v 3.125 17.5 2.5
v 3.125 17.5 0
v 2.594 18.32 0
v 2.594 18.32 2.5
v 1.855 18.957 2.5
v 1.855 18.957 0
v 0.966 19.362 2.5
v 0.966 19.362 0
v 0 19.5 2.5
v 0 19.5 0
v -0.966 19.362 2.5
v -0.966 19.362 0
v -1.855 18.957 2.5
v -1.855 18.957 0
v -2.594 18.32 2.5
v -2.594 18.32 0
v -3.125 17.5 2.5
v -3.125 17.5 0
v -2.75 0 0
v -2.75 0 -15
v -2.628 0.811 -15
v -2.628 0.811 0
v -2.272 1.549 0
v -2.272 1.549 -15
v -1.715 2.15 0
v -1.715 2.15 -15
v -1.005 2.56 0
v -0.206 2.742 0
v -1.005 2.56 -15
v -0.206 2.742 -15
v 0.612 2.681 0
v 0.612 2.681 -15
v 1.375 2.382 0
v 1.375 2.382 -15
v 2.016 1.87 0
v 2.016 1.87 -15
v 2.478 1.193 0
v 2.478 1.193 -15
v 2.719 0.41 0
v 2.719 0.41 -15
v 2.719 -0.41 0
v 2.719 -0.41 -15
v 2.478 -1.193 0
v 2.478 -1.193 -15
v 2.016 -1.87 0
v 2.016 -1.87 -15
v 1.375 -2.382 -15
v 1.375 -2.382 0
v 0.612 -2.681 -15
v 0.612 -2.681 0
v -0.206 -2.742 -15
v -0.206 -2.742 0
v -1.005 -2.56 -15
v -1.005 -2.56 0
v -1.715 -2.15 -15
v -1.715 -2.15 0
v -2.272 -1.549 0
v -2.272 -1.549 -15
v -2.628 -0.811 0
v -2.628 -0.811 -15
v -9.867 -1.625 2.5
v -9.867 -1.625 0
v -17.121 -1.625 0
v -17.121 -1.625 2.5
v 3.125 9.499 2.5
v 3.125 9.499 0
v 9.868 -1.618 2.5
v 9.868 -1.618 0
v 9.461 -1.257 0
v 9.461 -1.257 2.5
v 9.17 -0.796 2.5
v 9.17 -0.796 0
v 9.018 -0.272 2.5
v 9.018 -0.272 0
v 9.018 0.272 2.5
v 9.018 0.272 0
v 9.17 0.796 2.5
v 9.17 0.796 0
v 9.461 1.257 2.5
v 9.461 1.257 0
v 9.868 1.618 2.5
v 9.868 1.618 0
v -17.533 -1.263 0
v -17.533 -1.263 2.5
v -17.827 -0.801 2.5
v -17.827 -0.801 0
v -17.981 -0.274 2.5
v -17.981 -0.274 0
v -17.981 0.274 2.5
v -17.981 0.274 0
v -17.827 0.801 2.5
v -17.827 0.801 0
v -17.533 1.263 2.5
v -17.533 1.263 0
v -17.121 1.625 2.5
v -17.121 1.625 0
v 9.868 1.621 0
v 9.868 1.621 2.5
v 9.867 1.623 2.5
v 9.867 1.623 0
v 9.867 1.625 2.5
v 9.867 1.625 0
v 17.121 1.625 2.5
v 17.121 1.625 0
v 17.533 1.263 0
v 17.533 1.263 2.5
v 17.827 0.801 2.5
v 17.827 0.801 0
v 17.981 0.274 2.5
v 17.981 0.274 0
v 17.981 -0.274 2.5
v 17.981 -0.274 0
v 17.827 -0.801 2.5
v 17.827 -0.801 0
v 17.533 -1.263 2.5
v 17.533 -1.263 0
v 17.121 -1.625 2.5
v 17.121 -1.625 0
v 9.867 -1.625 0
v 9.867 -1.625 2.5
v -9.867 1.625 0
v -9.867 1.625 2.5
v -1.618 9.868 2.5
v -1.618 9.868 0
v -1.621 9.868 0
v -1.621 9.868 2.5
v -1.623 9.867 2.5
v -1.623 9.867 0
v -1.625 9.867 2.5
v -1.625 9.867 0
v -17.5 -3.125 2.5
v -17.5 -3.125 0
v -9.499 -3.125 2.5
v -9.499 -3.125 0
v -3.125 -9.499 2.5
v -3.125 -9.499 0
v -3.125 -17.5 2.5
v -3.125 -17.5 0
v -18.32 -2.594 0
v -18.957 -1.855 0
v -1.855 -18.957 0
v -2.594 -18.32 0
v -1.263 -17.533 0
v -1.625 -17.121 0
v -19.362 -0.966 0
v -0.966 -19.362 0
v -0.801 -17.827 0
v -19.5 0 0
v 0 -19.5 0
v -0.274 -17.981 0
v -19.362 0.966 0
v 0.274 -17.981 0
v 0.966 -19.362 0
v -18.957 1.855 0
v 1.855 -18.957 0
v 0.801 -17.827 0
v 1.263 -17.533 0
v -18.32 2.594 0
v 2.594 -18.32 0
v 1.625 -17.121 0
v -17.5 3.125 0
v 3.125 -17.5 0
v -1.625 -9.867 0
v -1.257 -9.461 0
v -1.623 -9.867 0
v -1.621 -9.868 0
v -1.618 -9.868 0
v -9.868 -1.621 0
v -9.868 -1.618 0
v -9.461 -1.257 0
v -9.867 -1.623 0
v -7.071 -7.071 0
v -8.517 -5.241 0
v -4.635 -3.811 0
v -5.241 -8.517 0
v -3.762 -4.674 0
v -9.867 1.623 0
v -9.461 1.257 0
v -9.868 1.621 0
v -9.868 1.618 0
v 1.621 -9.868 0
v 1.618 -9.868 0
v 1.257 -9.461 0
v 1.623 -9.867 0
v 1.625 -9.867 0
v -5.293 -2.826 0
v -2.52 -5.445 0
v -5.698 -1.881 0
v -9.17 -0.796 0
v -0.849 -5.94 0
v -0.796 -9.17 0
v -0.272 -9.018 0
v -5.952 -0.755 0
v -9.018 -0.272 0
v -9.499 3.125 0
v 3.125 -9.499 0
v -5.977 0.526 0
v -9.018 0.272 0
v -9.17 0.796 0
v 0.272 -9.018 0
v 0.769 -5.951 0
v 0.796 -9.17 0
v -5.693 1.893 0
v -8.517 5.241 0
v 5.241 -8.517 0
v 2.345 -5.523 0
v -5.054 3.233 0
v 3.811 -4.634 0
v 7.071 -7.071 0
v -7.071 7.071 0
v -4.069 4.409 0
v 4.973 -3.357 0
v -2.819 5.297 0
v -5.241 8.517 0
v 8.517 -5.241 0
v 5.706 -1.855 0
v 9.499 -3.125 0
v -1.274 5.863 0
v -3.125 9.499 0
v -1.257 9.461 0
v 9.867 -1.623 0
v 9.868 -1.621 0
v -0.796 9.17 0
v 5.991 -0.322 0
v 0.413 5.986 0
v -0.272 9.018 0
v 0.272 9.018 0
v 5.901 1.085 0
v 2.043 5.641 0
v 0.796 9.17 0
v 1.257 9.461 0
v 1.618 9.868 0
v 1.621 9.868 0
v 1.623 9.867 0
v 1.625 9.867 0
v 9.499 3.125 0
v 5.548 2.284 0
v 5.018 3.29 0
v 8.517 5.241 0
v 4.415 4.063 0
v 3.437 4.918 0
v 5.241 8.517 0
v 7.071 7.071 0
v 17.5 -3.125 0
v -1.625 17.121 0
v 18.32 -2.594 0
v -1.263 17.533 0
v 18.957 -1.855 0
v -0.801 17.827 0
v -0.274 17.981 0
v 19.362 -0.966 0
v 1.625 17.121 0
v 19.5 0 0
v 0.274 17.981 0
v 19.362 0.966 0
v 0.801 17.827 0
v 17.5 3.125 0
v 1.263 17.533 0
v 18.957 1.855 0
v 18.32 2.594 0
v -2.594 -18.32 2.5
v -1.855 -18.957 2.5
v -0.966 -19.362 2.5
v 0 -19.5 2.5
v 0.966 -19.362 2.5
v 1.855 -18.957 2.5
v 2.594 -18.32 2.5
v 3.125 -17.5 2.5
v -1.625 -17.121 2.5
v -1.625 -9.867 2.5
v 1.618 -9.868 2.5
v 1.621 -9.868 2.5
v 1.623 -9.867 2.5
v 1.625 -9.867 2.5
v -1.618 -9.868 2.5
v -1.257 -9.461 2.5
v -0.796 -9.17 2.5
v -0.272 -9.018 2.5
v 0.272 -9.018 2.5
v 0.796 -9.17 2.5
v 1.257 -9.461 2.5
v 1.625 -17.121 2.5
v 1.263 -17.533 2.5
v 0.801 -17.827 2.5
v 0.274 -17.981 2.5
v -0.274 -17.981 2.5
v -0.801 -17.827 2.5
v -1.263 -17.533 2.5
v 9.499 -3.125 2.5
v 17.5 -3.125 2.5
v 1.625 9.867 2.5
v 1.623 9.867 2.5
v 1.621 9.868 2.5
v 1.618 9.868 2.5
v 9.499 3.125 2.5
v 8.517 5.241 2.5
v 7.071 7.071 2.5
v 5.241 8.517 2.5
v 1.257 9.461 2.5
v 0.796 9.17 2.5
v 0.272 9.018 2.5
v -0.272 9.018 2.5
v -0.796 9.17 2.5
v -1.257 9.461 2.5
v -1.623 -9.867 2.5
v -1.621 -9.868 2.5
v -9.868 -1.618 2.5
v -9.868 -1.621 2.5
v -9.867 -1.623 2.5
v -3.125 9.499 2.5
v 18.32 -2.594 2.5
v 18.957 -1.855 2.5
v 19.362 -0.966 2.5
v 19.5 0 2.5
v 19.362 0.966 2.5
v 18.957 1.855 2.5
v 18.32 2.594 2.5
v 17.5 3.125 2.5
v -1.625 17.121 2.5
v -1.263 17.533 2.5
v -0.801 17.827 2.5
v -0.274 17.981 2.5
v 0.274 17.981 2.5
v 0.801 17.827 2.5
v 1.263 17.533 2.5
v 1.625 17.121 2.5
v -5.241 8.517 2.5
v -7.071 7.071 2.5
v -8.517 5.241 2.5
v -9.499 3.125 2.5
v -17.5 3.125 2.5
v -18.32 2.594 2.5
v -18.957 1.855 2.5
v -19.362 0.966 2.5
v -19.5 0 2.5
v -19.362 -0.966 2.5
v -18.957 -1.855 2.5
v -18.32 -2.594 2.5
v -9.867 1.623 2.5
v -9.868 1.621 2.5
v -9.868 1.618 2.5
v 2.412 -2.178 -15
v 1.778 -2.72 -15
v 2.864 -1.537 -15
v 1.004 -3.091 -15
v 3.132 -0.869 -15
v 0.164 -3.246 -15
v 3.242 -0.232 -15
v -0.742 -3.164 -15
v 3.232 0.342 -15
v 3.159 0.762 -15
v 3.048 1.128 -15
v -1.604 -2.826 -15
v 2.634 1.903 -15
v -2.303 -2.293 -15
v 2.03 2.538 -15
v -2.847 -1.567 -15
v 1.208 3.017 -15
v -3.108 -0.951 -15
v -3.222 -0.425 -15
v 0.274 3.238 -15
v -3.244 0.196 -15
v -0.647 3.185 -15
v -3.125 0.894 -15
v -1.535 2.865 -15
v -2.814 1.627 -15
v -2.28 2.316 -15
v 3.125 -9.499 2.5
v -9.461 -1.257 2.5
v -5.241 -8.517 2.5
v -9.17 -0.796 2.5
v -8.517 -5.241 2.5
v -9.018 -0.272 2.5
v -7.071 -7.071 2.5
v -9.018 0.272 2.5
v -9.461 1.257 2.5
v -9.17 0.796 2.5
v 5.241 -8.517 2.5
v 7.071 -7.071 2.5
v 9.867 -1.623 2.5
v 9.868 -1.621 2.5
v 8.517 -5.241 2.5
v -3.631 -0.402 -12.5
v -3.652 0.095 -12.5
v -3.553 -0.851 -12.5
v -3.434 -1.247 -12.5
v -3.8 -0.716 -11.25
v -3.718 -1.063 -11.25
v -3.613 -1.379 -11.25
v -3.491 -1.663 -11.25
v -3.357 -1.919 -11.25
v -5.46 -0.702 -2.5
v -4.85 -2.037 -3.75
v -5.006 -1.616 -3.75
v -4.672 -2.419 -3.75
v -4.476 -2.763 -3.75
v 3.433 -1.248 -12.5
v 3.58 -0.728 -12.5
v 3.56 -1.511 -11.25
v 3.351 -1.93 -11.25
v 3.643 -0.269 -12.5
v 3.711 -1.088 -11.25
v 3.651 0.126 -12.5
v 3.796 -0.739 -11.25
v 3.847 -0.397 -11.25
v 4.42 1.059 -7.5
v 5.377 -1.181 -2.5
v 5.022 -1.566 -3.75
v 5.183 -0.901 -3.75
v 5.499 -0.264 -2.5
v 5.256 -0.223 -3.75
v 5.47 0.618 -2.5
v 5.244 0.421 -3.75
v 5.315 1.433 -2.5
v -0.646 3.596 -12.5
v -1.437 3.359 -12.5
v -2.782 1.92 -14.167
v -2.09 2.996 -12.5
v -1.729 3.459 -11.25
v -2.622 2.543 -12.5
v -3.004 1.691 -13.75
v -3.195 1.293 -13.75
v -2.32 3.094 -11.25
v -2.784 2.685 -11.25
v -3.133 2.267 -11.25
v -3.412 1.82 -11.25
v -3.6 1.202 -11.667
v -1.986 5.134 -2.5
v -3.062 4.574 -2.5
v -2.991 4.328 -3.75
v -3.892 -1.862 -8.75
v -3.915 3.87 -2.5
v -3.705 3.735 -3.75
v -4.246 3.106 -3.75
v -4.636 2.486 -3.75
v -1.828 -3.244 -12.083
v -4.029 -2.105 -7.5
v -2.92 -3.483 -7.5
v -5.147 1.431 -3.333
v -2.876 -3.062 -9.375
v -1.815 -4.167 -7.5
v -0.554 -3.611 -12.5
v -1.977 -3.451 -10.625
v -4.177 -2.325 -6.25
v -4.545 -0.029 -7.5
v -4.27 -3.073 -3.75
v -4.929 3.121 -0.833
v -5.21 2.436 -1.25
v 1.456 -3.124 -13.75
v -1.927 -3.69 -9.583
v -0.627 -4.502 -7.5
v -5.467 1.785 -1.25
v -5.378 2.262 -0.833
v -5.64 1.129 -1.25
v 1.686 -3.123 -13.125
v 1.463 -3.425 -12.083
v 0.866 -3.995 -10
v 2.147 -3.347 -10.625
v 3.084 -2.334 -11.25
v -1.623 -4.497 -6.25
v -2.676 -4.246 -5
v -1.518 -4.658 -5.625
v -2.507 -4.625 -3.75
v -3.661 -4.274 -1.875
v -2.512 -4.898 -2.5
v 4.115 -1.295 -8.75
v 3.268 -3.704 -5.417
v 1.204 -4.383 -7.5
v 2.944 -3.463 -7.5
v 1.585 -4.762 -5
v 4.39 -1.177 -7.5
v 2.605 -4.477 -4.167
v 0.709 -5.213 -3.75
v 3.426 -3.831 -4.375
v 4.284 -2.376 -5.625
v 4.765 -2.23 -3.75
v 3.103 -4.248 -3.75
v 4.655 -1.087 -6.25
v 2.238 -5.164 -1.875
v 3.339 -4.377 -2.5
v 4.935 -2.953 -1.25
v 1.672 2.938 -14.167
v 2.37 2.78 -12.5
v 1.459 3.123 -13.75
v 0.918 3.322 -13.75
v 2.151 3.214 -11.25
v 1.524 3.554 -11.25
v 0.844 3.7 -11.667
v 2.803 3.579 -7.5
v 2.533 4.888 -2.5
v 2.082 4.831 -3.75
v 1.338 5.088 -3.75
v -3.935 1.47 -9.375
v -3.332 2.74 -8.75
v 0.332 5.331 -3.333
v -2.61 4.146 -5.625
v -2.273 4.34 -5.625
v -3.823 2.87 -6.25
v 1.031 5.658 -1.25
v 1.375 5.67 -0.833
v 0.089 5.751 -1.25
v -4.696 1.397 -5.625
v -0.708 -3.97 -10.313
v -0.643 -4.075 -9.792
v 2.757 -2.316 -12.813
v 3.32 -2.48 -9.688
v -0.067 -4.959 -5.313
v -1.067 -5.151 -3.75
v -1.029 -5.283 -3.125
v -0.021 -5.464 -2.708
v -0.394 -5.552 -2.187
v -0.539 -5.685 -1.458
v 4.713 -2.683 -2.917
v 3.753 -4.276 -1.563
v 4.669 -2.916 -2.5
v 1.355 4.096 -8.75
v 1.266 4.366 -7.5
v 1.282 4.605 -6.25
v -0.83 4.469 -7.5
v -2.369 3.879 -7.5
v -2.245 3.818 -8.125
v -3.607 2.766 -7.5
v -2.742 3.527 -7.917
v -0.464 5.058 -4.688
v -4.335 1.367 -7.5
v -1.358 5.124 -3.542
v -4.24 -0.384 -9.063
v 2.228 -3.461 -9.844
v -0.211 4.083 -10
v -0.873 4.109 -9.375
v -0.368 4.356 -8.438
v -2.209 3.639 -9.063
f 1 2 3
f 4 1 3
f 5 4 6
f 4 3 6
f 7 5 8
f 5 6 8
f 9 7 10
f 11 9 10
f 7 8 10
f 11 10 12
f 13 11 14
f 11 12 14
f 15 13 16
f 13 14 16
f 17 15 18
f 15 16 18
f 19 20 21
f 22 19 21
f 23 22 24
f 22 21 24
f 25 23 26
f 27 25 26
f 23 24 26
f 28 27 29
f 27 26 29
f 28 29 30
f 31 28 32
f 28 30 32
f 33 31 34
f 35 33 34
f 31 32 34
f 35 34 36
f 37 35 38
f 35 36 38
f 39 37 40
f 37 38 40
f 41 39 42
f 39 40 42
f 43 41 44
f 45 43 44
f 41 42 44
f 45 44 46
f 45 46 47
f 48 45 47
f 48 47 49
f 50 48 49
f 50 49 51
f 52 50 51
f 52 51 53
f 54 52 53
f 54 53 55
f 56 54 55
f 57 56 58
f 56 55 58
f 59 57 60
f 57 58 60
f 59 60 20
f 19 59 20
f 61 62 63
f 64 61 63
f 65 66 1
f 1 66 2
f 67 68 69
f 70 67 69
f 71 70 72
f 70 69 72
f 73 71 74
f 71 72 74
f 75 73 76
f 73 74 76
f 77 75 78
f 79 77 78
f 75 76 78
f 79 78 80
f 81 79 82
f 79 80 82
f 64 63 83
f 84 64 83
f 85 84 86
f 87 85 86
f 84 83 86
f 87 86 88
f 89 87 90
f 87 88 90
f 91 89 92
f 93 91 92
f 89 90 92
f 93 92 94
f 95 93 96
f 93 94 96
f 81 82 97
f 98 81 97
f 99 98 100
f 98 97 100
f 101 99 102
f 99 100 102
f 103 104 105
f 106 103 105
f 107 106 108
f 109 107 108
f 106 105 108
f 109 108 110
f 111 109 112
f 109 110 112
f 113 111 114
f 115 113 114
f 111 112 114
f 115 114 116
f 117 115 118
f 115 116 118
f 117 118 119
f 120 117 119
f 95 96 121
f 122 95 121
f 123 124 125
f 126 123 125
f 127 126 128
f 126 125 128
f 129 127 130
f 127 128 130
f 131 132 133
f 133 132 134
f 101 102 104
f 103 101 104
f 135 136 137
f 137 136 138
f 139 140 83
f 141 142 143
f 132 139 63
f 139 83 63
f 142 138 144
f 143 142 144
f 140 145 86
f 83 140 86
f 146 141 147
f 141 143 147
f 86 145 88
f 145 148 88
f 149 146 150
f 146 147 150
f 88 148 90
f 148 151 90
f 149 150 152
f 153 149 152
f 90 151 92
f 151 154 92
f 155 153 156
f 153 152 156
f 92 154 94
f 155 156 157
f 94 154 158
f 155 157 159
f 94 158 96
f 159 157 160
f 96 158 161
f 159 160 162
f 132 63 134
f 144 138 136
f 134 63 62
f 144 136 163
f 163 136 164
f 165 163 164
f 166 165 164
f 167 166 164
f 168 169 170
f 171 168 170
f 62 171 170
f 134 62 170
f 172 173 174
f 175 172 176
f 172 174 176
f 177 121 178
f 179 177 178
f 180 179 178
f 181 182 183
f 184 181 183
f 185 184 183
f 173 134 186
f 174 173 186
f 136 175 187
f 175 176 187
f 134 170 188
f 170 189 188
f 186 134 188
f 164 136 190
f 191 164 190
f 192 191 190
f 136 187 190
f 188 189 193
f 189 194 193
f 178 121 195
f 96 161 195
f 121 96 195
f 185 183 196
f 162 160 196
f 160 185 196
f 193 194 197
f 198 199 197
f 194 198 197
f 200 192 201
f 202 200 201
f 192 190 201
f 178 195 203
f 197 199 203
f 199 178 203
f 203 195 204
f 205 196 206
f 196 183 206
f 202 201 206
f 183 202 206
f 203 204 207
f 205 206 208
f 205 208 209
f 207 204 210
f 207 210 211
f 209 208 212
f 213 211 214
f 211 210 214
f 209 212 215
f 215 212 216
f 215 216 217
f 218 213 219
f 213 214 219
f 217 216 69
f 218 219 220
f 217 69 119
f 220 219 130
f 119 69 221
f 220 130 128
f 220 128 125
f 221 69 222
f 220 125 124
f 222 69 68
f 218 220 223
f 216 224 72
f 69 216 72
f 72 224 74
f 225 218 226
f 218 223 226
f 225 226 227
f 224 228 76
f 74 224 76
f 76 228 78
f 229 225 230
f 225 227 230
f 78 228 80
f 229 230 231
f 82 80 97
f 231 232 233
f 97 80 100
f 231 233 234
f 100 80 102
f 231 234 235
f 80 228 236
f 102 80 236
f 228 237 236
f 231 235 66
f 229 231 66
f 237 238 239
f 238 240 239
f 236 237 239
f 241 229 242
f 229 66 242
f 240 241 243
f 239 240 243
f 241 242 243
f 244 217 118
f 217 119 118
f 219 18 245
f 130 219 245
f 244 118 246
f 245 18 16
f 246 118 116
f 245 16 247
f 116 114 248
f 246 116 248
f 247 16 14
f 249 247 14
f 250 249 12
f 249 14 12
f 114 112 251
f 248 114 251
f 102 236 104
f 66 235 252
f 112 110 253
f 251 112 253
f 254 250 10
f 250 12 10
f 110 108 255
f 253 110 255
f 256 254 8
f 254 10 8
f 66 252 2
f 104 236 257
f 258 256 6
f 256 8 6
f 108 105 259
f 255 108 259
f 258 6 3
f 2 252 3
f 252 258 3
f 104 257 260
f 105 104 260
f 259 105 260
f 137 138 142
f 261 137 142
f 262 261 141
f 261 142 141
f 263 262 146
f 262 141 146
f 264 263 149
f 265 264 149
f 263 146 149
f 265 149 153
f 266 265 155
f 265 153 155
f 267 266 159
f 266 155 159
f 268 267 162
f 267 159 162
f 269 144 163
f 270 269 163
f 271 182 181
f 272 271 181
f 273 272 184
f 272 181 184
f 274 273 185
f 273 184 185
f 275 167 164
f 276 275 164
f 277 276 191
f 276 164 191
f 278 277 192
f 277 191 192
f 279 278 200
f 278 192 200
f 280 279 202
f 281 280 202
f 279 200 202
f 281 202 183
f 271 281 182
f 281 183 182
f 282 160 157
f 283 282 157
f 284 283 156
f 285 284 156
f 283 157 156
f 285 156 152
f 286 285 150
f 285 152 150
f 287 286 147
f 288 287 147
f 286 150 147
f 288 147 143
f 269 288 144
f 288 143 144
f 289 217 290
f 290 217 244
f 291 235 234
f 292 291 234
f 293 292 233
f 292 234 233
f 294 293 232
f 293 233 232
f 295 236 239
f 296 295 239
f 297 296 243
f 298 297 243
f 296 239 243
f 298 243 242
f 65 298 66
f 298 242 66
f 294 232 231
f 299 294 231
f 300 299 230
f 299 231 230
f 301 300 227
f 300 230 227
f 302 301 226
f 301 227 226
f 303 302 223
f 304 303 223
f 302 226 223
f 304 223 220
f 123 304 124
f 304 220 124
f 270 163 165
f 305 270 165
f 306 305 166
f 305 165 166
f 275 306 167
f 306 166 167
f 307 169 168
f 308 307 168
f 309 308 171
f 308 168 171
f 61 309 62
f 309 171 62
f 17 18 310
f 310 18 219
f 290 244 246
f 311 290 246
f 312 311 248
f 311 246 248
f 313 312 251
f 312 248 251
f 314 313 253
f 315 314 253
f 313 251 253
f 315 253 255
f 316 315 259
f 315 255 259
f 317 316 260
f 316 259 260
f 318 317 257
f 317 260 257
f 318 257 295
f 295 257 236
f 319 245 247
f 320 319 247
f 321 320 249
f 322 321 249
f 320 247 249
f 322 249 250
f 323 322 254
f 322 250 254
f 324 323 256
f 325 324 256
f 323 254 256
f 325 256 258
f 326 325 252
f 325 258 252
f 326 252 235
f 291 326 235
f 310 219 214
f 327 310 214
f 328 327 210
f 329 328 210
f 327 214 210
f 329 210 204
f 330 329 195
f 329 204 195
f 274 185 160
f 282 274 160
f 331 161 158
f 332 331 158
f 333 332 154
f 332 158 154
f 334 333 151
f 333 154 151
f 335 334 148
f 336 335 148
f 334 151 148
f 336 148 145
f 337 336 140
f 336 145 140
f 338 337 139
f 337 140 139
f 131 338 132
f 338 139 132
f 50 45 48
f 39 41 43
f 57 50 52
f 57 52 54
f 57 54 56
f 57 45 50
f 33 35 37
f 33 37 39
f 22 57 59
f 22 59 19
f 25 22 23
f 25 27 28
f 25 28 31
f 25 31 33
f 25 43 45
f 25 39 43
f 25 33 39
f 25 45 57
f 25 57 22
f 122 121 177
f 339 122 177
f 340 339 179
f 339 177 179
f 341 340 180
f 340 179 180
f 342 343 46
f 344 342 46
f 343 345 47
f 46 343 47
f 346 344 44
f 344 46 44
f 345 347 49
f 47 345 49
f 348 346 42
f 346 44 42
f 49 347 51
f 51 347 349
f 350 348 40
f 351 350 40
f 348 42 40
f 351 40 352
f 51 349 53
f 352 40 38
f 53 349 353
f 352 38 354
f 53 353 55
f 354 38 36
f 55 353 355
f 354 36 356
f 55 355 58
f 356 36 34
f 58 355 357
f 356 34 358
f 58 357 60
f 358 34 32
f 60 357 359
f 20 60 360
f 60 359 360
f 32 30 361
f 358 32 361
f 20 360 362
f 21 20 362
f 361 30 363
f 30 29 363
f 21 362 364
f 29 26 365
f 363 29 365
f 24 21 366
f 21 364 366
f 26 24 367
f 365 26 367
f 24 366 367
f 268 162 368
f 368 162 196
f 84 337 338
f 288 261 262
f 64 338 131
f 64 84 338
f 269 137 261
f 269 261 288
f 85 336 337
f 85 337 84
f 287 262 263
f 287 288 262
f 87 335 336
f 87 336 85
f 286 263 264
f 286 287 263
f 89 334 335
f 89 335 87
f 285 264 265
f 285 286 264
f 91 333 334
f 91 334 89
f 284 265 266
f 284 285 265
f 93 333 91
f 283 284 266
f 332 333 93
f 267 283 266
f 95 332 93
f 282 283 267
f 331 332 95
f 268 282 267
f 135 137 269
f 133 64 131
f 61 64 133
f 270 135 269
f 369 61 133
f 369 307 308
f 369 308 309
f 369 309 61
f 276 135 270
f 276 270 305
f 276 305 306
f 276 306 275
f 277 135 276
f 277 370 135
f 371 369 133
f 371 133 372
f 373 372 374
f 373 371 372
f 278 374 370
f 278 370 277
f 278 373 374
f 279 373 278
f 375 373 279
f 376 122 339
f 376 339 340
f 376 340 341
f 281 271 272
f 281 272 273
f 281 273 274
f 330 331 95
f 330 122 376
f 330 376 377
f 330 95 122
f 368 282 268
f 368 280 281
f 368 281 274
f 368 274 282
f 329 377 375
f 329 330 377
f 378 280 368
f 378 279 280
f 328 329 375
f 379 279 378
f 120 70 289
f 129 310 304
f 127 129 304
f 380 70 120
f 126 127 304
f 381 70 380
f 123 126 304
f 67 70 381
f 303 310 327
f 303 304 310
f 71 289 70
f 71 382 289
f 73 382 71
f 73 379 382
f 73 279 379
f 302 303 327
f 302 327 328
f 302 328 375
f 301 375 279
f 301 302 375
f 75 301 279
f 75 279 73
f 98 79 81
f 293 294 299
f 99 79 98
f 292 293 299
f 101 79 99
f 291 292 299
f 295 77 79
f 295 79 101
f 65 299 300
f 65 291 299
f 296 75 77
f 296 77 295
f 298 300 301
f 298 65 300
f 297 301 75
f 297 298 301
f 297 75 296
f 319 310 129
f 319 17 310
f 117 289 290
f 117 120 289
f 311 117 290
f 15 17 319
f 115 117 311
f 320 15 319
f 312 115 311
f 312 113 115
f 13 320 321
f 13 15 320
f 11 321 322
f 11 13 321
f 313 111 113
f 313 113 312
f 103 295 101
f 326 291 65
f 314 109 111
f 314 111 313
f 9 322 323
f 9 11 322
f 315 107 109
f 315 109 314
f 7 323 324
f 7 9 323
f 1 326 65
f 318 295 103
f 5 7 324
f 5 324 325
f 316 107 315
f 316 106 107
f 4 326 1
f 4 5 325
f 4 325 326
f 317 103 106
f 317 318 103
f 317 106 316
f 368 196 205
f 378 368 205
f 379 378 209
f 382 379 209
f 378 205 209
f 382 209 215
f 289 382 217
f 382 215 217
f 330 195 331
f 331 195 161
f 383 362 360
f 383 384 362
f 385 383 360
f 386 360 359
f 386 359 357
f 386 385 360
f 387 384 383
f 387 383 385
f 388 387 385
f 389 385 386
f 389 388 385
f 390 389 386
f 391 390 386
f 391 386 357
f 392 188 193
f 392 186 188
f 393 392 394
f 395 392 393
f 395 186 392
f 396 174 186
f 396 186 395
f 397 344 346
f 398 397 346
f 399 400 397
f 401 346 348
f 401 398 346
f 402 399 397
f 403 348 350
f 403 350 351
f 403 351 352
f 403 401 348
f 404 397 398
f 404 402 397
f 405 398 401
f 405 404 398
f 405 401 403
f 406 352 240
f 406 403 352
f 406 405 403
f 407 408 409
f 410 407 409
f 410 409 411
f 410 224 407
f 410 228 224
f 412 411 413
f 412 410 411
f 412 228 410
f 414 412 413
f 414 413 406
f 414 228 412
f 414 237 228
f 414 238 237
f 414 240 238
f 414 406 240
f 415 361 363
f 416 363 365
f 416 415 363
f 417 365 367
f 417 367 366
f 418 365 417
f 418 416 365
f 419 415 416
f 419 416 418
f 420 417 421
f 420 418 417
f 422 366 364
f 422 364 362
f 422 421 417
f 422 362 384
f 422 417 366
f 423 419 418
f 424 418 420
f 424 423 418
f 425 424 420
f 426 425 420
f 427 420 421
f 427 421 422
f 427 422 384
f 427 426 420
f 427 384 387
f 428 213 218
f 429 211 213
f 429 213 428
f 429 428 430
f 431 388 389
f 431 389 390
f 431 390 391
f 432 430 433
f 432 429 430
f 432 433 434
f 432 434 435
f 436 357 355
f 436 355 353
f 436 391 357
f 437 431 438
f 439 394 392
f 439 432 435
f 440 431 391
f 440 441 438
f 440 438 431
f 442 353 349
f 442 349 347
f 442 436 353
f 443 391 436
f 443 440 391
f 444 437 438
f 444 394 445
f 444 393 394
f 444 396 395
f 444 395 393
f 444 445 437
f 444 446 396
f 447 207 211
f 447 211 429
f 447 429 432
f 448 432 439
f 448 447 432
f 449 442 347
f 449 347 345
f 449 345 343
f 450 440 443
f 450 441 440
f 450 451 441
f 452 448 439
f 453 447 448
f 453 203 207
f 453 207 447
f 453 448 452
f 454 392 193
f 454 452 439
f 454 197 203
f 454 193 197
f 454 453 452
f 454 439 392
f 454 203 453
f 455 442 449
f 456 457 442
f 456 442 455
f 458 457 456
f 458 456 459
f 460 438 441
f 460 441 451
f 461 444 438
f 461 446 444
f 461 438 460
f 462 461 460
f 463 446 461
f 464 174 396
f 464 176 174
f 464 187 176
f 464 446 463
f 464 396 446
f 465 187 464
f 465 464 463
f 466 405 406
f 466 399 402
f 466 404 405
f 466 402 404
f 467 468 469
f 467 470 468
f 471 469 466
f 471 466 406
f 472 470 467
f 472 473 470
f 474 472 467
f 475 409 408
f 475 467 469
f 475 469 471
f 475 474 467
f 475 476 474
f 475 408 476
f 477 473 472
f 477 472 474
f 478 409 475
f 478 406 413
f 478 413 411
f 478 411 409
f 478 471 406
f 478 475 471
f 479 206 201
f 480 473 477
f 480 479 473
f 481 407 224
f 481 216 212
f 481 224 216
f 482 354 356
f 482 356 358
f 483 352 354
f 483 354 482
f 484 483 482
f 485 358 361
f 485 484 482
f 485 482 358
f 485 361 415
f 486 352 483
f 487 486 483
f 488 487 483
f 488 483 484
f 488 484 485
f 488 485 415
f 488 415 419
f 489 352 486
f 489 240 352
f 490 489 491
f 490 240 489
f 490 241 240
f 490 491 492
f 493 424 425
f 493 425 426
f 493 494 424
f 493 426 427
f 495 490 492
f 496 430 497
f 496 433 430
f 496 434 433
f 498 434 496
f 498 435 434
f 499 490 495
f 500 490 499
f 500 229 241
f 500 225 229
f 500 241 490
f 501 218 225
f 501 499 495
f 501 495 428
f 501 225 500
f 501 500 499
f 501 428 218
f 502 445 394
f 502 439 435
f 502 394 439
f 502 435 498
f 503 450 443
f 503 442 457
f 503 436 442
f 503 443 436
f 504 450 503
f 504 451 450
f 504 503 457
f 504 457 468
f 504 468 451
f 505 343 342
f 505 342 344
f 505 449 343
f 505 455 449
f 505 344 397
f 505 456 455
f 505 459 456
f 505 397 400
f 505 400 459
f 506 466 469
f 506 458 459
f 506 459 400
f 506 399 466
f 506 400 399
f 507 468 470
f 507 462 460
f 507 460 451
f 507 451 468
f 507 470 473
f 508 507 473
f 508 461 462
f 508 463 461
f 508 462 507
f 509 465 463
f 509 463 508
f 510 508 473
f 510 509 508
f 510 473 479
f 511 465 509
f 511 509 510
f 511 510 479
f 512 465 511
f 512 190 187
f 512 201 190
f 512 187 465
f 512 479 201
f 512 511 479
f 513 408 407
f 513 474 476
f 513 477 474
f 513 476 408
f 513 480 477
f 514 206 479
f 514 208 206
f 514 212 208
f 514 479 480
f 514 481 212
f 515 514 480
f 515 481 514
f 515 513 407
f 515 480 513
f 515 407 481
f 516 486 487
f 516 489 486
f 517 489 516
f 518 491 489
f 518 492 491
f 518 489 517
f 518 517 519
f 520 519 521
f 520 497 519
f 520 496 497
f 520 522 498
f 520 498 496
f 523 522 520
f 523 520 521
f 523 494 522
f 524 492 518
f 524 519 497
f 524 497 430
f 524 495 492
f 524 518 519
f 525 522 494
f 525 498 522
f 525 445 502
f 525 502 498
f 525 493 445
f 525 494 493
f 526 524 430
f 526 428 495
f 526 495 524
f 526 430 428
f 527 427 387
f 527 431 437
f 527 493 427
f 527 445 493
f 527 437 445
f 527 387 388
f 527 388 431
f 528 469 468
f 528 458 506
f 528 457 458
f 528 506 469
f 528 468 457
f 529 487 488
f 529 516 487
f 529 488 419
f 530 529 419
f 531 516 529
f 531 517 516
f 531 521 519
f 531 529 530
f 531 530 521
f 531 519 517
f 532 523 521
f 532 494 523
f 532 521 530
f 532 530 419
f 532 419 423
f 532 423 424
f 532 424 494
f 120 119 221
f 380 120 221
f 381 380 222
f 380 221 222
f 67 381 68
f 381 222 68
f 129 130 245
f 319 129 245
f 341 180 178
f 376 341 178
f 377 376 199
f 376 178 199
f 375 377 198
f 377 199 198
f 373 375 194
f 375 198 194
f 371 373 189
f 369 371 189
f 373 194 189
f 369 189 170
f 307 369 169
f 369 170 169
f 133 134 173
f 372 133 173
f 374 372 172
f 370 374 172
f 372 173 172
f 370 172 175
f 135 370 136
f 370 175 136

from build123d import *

# Parameters (mm, degrees)
BOSS_EXTRUDE1_DEPTH = 2.5
SKETCH16_R          = 2.75
CUT_EXTRUDE2_DEPTH  = 15


with BuildPart() as part:
    # Sketch1 → Boss-Extrude1 (new body)
    with BuildSketch(Plane.XY):
        with BuildLine():
            Line((3.125, -17.5), (3.125, -9.499177596))
            ThreePointArc((3.125, -9.499177596), (7.071067812, -7.071067812), (9.499177596, -3.125))
            Line((9.499177596, -3.125), (17.5, -3.125))
            ThreePointArc((17.5, -3.125), (19.5, 0), (17.5, 3.125))
            Line((17.5, 3.125), (9.499177596, 3.125))
            ThreePointArc((9.499177596, 3.125), (7.071067812, 7.071067812), (3.125, 9.499177596))
            Line((3.125, 9.499177596), (3.125, 17.5))
            ThreePointArc((3.125, 17.5), (0, 19.5), (-3.125, 17.5))
            Line((-3.125, 17.5), (-3.125, 9.499177596))
            ThreePointArc((-3.125, 9.499177596), (-7.071067812, 7.071067812), (-9.499177596, 3.125))
            Line((-9.499177596, 3.125), (-17.5, 3.125))
            ThreePointArc((-17.5, 3.125), (-19.5, 0), (-17.5, -3.125))
            Line((-17.5, -3.125), (-9.499177596, -3.125))
            ThreePointArc((-9.499177596, -3.125), (-7.071067812, -7.071067812), (-3.125, -9.499177596))
            Line((-3.125, -9.499177596), (-3.125, -17.5))
            ThreePointArc((-3.125, -17.5), (0, -19.5), (3.125, -17.5))
        make_face()
        with BuildLine():
            ThreePointArc((-9.868180698, -1.618335477), (-9.86763363, -1.621667831), (-9.867085436, -1.625))
            Line((-9.867085436, -1.625), (-9.878306468, -1.625))
            Line((-9.878306468, -1.625), (-17.120871128, -1.625))
            ThreePointArc((-17.120871128, -1.625), (-18, 0), (-17.120871128, 1.625))
            Line((-17.120871128, 1.625), (-9.878306468, 1.625))
            Line((-9.878306468, 1.625), (-9.867085436, 1.625))
            ThreePointArc((-9.867085436, 1.625), (-9.86763363, 1.621667831), (-9.868180698, 1.618335477))
            ThreePointArc((-9.868180698, 1.618335477), (-8.999177596, 0), (-9.868180698, -1.618335477))
        make_face(mode=Mode.SUBTRACT)
        with BuildLine():
            ThreePointArc((-1.618335477, -9.868180698), (0, -8.999177596), (1.618335477, -9.868180698))
            ThreePointArc((1.618335477, -9.868180698), (1.621667831, -9.86763363), (1.625, -9.867085436))
            Line((1.625, -9.867085436), (1.625, -9.878306468))
            Line((1.625, -9.878306468), (1.625, -17.120871128))
            ThreePointArc((1.625, -17.120871128), (0, -18), (-1.625, -17.120871128))
            Line((-1.625, -17.120871128), (-1.625, -9.878306468))
            Line((-1.625, -9.878306468), (-1.625, -9.867085436))
            ThreePointArc((-1.625, -9.867085436), (-1.621667831, -9.86763363), (-1.618335477, -9.868180698))
        make_face(mode=Mode.SUBTRACT)
        with BuildLine():
            Line((1.625, 9.878306468), (1.625, 9.867085436))
            ThreePointArc((1.625, 9.867085436), (1.621667831, 9.86763363), (1.618335477, 9.868180698))
            ThreePointArc((1.618335477, 9.868180698), (0, 8.999177596), (-1.618335477, 9.868180698))
            ThreePointArc((-1.618335477, 9.868180698), (-1.621667831, 9.86763363), (-1.625, 9.867085436))
            Line((-1.625, 9.867085436), (-1.625, 9.878306468))
            Line((-1.625, 9.878306468), (-1.625, 17.120871128))
            ThreePointArc((-1.625, 17.120871128), (0, 18), (1.625, 17.120871128))
            Line((1.625, 17.120871128), (1.625, 9.878306468))
        make_face(mode=Mode.SUBTRACT)
        with BuildLine():
            ThreePointArc((9.868180698, 1.618335477), (9.86763363, 1.621667831), (9.867085436, 1.625))
            Line((9.867085436, 1.625), (9.878306468, 1.625))
            Line((9.878306468, 1.625), (17.120871128, 1.625))
            ThreePointArc((17.120871128, 1.625), (18, 0), (17.120871128, -1.625))
            Line((17.120871128, -1.625), (9.878306468, -1.625))
            Line((9.878306468, -1.625), (9.867085436, -1.625))
            ThreePointArc((9.867085436, -1.625), (9.86763363, -1.621667831), (9.868180698, -1.618335477))
            ThreePointArc((9.868180698, -1.618335477), (8.999177596, 0), (9.868180698, 1.618335477))
        make_face(mode=Mode.SUBTRACT)
    extrude(amount=BOSS_EXTRUDE1_DEPTH)

    # Loft2: read off the stored shape, not the designer's step
    # Loft2: loft between two sections, ruled curve by curve
    loft2_from = [
        Edge.make_bspline([(3.048060313, 1.127753665, -15), (0.792552983, 7.223874291, -15), (-5.303567643, 4.968366961, -15), (-3.048060313, -1.127753665, -15), (-0.792552983, -7.223874291, -15), (5.303567643, -4.968366961, -15), (3.048060313, 1.127753665, -15)], [0, 0, 0, 0, 0.5, 0.5, 0.5, 1, 1, 1, 1], 3, [1, 0.333333333, 0.333333333, 1, 0.333333333, 0.333333333, 1]),
    ]
    loft2_to = [
        Edge.make_bspline([(4.41488096, 4.063105476, 0), (-3.711329991, 12.892867396, 0), (-12.541091911, 4.766656445, 0), (-4.41488096, -4.063105476, 0), (3.711329991, -12.892867396, 0), (12.541091911, -4.766656445, 0), (4.41488096, 4.063105476, 0)], [0, 0, 0, 0, 0.5, 0.5, 0.5, 1, 1, 1, 1], 3, [1, 0.333333333, 0.333333333, 1, 0.333333333, 0.333333333, 1]),
    ]
    loft2 = Solid(Shell([*[Face.make_surface_from_curves(loft2_from[k], loft2_to[k]) for k in range(1)], Face(Wire(loft2_from)), Face(Wire(loft2_to))]))
    add(loft2)

    # Sketch16 → Cut-Extrude2 (cut)
    with BuildSketch(Plane(origin=(0, 0, -15), x_dir=(-1, 0, 0), z_dir=(0, 0, -1))):
        Circle(SKETCH16_R)
    extrude(amount=-CUT_EXTRUDE2_DEPTH, mode=Mode.SUBTRACT)


solid = part.part
